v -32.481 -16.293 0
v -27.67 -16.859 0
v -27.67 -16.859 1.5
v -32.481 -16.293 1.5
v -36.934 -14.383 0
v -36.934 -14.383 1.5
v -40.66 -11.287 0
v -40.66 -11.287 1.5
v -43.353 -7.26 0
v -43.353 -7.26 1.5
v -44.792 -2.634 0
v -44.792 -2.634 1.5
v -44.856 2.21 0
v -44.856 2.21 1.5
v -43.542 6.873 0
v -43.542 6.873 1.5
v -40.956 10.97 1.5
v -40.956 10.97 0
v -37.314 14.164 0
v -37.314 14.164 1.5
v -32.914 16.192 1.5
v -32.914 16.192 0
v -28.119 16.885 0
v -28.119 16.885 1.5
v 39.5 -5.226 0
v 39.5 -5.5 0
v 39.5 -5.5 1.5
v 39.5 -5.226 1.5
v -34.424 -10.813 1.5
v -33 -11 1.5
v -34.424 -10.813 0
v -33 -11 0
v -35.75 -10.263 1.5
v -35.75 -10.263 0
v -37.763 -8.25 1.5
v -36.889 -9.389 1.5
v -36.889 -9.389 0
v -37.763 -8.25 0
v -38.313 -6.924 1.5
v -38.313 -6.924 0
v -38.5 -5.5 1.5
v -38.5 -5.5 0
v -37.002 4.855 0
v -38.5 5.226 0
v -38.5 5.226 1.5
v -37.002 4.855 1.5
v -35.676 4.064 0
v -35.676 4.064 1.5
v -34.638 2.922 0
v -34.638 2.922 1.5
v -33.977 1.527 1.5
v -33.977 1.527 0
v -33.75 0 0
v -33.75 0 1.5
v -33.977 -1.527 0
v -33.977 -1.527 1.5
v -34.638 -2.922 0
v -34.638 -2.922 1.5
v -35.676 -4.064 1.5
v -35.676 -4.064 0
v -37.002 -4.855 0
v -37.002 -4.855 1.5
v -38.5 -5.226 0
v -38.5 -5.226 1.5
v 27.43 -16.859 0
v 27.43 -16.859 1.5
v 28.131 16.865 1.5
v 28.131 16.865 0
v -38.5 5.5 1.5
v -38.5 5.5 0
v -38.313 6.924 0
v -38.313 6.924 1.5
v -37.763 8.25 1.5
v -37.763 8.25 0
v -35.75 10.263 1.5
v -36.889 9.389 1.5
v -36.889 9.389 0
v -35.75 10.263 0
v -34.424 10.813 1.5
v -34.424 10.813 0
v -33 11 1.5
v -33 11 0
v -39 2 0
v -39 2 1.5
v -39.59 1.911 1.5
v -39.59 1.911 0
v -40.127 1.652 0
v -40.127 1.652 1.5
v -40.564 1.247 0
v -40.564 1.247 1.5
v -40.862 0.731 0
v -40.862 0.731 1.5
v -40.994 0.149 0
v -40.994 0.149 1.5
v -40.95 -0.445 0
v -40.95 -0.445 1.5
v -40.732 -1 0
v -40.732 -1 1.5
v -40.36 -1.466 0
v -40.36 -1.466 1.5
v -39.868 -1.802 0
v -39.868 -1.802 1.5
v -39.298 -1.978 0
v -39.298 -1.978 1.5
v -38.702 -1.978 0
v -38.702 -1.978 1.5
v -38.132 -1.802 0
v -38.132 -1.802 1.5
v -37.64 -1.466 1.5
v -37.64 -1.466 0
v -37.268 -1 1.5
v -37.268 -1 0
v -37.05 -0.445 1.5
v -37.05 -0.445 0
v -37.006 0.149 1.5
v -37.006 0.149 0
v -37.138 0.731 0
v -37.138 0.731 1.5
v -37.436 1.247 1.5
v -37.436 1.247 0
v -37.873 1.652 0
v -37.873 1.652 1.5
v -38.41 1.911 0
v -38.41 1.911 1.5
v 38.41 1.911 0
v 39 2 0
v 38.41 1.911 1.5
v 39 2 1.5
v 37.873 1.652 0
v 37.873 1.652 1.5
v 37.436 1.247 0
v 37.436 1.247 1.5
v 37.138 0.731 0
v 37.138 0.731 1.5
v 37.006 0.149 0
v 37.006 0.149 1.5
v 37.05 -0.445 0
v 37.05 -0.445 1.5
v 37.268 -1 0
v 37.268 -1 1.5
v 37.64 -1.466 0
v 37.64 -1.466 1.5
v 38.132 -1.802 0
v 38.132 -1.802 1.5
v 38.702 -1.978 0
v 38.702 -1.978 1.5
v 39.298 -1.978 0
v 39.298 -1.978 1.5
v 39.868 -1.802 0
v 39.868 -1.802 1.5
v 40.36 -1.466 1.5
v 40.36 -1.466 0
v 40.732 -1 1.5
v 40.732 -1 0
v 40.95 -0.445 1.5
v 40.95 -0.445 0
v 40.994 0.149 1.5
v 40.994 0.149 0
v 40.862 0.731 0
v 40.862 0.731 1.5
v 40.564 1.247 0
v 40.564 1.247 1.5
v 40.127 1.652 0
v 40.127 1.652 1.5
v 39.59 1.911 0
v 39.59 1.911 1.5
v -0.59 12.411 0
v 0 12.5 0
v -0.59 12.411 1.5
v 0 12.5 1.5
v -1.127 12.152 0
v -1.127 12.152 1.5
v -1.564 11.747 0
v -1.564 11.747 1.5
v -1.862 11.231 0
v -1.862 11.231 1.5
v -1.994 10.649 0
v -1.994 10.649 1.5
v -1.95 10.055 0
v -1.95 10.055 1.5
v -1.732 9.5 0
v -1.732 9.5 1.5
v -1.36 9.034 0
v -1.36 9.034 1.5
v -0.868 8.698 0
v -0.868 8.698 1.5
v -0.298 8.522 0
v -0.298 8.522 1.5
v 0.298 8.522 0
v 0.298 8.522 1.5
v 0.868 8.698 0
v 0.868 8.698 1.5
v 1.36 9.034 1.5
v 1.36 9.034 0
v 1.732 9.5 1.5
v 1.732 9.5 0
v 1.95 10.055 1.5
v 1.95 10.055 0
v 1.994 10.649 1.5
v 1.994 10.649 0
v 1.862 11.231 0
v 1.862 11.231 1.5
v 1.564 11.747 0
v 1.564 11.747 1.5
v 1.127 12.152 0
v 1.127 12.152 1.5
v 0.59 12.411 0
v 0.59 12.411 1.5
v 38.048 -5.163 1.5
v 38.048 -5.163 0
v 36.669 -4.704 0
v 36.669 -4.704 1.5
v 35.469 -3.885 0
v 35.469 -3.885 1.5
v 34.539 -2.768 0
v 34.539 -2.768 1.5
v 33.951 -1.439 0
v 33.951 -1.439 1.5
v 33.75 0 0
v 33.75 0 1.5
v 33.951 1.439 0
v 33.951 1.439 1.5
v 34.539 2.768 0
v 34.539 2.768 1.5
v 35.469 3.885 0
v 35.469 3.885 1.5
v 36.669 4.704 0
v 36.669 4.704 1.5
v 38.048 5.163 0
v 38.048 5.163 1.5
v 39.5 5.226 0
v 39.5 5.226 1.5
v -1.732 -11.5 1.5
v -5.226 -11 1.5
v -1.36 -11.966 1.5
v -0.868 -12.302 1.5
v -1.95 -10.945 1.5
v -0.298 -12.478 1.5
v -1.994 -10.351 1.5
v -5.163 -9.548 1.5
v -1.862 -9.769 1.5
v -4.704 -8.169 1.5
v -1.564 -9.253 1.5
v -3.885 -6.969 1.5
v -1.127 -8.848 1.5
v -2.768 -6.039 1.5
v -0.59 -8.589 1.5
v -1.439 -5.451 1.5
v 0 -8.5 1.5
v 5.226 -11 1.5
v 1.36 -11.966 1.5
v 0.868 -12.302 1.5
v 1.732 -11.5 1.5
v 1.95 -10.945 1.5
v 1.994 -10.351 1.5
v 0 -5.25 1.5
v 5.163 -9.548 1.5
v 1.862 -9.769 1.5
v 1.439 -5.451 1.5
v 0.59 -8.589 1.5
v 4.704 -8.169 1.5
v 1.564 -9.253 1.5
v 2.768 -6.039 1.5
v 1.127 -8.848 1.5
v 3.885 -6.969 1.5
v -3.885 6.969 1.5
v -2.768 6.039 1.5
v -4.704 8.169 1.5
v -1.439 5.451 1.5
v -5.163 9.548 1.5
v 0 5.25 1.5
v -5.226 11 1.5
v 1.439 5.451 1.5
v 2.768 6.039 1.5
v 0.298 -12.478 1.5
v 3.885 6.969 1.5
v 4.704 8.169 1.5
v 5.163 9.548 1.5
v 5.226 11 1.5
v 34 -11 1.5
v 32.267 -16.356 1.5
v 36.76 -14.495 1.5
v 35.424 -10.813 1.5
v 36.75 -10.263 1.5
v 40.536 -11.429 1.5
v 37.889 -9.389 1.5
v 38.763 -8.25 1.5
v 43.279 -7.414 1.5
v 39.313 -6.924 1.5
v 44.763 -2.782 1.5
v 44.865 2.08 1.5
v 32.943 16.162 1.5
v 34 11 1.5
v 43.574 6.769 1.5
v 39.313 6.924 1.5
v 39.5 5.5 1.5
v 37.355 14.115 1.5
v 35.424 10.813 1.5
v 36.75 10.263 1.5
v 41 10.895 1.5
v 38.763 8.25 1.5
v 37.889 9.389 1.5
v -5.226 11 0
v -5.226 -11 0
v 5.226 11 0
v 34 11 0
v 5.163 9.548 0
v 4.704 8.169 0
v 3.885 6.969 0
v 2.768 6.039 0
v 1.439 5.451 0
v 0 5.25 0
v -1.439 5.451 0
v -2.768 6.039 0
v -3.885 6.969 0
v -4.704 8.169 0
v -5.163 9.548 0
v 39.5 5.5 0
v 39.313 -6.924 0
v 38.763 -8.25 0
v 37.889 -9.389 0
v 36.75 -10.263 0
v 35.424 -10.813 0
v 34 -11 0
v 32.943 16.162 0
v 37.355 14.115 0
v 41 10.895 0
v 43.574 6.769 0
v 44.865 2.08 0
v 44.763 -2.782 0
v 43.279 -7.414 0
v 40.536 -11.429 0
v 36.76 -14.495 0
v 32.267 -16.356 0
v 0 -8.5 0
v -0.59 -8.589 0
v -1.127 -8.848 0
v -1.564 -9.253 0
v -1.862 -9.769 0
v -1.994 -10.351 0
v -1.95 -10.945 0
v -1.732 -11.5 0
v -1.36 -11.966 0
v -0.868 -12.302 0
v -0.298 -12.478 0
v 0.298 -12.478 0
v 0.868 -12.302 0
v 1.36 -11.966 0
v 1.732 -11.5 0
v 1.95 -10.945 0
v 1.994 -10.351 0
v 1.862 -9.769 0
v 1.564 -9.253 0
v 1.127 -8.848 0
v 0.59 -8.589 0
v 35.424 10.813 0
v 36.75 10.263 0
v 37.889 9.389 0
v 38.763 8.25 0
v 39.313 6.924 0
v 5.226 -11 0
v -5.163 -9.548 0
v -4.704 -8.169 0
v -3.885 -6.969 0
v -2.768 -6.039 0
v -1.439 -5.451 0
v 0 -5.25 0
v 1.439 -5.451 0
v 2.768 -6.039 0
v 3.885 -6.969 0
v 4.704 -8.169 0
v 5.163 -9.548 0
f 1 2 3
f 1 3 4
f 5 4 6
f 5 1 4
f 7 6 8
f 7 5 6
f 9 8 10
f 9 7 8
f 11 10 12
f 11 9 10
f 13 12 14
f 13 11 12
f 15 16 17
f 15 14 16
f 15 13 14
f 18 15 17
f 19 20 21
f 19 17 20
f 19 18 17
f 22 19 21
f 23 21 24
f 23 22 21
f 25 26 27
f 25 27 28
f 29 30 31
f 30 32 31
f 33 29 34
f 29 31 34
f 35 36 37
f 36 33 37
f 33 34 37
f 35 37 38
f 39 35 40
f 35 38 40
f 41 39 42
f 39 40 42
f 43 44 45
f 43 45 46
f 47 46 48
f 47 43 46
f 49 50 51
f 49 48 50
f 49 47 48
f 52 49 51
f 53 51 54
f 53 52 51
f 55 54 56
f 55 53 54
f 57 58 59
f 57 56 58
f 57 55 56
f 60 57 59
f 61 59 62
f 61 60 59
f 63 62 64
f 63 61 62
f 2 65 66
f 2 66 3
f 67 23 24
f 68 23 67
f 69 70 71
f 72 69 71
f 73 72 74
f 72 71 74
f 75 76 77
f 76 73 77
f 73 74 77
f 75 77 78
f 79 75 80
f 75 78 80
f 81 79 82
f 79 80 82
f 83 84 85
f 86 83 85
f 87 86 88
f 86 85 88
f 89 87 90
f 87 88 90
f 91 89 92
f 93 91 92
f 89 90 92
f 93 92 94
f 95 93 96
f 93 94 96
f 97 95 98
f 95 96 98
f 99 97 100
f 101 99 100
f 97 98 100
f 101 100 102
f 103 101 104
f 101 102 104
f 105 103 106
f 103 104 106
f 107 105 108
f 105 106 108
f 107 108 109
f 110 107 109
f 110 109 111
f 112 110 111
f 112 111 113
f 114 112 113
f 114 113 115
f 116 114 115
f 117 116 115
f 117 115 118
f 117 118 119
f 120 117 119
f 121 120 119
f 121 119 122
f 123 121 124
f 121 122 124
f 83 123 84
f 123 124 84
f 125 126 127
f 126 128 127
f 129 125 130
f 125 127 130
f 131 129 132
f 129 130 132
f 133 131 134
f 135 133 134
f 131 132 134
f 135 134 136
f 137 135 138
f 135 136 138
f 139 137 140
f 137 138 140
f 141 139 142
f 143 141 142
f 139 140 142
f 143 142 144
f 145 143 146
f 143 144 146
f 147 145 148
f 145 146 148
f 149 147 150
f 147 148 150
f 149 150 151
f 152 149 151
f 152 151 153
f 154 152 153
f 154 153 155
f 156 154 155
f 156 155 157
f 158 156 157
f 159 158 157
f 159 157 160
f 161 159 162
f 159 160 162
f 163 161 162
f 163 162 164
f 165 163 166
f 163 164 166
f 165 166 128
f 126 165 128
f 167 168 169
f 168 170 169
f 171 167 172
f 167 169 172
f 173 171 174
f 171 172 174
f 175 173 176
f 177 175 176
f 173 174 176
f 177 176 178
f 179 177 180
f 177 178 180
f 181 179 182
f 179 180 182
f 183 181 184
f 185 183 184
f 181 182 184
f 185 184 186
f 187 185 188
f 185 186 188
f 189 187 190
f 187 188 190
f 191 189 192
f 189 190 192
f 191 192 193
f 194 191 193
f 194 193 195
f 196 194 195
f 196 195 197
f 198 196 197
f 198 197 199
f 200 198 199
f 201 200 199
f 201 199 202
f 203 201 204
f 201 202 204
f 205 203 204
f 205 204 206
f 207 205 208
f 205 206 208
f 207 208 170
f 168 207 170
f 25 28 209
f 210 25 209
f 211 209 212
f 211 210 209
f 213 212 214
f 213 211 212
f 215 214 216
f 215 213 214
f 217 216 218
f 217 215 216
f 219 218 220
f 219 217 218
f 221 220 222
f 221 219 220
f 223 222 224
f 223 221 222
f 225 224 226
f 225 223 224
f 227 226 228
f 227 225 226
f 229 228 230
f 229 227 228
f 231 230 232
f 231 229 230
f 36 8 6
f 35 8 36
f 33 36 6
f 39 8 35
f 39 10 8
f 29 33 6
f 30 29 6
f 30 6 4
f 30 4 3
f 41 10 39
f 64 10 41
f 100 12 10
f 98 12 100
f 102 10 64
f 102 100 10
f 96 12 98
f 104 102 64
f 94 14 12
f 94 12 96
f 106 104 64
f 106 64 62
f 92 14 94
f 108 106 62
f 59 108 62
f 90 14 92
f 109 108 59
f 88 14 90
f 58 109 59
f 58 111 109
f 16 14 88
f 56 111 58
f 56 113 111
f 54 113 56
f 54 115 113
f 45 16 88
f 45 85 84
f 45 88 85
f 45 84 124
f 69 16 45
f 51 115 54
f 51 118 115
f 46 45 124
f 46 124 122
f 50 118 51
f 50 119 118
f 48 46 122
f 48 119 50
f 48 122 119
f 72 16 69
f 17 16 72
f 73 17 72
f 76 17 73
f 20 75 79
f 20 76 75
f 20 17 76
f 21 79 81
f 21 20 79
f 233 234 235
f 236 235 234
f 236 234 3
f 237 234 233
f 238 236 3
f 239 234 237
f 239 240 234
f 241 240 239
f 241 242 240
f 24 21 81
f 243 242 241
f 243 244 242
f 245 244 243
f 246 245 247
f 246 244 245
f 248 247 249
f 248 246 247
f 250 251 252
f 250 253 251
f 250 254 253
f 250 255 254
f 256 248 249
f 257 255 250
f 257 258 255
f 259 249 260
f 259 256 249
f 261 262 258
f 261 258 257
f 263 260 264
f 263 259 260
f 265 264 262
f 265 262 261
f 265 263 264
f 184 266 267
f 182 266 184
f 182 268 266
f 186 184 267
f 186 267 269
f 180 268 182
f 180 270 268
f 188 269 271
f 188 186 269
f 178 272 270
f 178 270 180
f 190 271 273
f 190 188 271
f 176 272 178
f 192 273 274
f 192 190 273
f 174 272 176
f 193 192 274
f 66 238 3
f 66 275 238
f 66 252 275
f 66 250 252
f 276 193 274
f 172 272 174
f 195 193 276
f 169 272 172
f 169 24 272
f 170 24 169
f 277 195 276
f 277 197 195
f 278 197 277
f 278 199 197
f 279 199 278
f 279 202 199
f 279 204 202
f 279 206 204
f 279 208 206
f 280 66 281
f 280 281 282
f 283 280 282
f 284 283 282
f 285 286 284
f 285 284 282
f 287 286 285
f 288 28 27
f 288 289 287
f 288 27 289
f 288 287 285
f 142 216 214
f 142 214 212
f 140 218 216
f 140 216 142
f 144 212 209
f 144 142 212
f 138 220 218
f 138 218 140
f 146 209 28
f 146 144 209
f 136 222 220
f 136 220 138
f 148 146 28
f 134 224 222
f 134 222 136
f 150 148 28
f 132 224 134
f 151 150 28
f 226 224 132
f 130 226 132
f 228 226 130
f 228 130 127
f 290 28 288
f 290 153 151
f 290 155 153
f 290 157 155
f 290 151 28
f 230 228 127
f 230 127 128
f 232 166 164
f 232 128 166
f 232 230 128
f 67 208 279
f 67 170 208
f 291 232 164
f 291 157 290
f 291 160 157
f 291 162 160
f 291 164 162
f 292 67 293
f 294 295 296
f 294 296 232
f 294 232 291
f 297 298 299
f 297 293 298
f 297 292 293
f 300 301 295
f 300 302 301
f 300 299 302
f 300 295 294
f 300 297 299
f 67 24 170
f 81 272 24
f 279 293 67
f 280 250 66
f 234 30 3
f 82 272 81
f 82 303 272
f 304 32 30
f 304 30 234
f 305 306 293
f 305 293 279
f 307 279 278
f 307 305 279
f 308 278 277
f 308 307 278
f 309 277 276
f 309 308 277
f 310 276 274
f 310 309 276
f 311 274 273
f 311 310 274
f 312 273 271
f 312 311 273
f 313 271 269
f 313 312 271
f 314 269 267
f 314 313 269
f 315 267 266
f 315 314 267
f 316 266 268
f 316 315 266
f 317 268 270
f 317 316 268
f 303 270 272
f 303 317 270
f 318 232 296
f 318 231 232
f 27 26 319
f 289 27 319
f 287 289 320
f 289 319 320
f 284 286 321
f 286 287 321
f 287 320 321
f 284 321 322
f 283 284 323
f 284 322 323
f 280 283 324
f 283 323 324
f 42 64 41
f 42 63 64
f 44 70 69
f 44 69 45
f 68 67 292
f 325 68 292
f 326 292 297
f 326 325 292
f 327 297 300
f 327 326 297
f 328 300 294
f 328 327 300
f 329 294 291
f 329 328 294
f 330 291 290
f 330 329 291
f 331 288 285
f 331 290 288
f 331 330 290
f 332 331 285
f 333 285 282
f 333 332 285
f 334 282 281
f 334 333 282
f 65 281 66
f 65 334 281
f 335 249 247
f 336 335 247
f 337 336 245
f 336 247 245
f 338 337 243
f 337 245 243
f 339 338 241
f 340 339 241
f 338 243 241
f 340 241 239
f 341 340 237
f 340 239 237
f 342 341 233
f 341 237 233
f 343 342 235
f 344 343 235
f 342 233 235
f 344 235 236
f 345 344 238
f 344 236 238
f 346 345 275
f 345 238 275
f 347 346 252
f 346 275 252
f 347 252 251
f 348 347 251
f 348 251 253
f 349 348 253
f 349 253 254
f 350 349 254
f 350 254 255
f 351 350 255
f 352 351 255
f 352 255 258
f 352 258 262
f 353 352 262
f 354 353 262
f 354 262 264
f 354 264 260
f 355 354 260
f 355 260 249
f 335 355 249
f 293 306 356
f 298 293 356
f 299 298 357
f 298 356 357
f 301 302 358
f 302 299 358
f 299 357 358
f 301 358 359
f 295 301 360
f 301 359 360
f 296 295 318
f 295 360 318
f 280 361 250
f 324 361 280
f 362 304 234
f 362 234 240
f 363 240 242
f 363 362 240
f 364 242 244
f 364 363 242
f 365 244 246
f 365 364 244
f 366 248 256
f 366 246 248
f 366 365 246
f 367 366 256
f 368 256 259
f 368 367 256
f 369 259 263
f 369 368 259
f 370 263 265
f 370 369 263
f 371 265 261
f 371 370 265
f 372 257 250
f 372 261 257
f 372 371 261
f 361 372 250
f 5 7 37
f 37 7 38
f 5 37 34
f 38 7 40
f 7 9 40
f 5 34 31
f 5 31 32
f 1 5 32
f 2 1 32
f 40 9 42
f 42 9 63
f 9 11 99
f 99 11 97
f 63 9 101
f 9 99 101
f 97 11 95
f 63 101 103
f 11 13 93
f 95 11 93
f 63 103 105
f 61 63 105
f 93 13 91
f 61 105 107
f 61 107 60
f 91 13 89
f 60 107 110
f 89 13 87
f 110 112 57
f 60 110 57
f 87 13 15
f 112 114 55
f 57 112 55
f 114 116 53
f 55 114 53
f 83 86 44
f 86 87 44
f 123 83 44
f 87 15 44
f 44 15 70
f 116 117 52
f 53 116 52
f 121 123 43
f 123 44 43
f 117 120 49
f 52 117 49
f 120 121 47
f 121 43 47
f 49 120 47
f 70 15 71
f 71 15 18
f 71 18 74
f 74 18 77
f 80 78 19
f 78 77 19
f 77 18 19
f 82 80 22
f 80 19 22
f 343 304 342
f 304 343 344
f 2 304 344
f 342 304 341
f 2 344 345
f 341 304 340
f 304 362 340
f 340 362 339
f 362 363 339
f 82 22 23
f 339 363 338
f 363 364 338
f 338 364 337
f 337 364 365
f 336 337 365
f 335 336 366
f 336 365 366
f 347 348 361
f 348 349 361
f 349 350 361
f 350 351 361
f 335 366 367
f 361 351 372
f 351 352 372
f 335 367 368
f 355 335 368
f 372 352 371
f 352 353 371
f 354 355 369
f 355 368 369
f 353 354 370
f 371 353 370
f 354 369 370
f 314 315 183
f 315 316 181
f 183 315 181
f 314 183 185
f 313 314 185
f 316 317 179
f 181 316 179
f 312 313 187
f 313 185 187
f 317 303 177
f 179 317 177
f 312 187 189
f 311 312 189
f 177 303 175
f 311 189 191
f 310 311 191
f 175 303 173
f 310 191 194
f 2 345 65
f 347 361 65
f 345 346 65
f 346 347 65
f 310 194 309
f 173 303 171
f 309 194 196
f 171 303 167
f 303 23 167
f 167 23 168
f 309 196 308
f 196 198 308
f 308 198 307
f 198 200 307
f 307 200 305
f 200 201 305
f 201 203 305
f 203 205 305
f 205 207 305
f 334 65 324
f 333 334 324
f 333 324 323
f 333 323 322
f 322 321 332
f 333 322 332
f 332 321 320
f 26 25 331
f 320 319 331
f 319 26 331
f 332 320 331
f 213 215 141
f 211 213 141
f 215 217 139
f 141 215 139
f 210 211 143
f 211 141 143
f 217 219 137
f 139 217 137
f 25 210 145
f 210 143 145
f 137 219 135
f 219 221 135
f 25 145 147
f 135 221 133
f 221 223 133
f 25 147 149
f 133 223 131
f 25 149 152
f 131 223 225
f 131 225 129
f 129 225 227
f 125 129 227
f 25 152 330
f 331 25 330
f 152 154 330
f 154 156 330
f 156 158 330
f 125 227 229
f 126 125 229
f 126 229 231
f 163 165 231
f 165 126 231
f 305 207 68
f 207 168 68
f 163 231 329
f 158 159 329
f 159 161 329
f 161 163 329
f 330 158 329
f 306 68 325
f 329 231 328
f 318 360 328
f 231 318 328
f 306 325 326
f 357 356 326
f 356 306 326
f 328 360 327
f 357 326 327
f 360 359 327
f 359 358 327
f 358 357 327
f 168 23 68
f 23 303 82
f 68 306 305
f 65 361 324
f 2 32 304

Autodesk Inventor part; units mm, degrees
ref_plane "YZ Plane" through (0, 0, 0) normal (1, 0, 0) x (0, 1, 0)
ref_plane "XZ Plane" through (0, 0, 0) normal (0, 1, 0) x (-1, 0, 0)
ref_plane "XY Plane" through (0, 0, 0) normal (0, 0, 1) x (1, 0, 0)
sketch "Sketch1" plane through (0, 0, 0) normal (0, 0, 1) x (1, 0, 0)
  line L0 (-28.1189, 16.8852) -> (28.1311, 16.8648)
  line L1 (44.9939, -0.0102) -> (44.9939, -0.0102)
  line L2 (27.4299, -16.8586) -> (-27.6697, -16.8586)
  line L3 (-45, 0.0102) -> (-45, 0.0102)
  arc A0 (-28.1189, 16.8852) -> (-27.6697, -16.8586) centre (-28.125, 0.0102) ccw
  arc A1 (27.4299, -16.8586) -> (28.1311, 16.8648) centre (28.125, -0.0041) ccw
  point P0 (0, 0)
  point P1 (-45, 16.8914)
  point P2 (45, 16.8586)
  point P3 (-45, -16.8586)
  dimension "d7" = 4
  dimension "d8" = 4
  dimension "d9" = 4
  dimension "d10" = 4
  dimension "d11" = 78
  dimension "d12" = 21
  dimension "d13" = 39
  dimension "d0" = 90
  dimension "d1" = 33.75
  dimension "d2" = 16.875
  dimension "d3" = 16.875
  dimension "d4" = 90
  dimension "d5" = 56.25
  dimension "d6" = 28.125
sketch "Sketch2" plane through (0, 0, 0) normal (0, 0, 1) x (1, 0, 0)
  circle A0 centre (-39, 0) radius 2
  circle A1 centre (39, 0) radius 2
  circle A2 centre (0, -10.5) radius 2
  circle A3 centre (0, 10.5) radius 2
  point P0 (0, 0)
  point P1 (0, 0)
  point P2 (-3.3578, 23.5)
  dimension "d7" = 4
  dimension "d8" = 4
  dimension "d9" = 4
  dimension "d10" = 4
  dimension "d11" = 78
  dimension "d12" = 21
  dimension "d13" = 39
sketch "Sketch3" plane through (0, 0, 0) normal (0, 0, 1) x (1, 0, 0)
  arc A0 (-5.2261, 11) -> (5.2261, 11) centre (0, 10.5) ccw
  arc A1 (-38.5, -5.2262) -> (-38.5, 5.2261) centre (-39, 0) ccw
  arc A2 (5.2261, -11) -> (-5.2261, -11) centre (0, -10.5) ccw
  arc A3 (39.5, 5.2261) -> (39.5, -5.2262) centre (39, 0) ccw
  line L0 (-38.5, -5.2262) -> (-38.5, -5.5)
  line L1 (-33, -11) -> (-5.2261, -11)
  line L2 (39.5, 5.2261) -> (39.5, 5.5)
  line L3 (34, 11) -> (5.2261, 11)
  line L4 (-5.2261, 11) -> (-33, 11)
  line L5 (-38.5, 5.5) -> (-38.5, 5.2261)
  line L6 (5.2261, -11) -> (34, -11)
  line L7 (39.5, -5.5) -> (39.5, -5.2262)
  arc A4 (-33, 11) -> (-38.5, 5.5) centre (-33, 5.5) ccw
  arc A5 (-38.5, -5.5) -> (-33, -11) centre (-33, -5.5) ccw
  arc A6 (39.5, 5.5) -> (34, 11) centre (34, 5.5) ccw
  arc A7 (34, -11) -> (39.5, -5.5) centre (34, -5.5) ccw
  point P0 (43.6422, -42)
  dimension "d14" = 5.5
  dimension "d15" = 5.25
  dimension "d16" = 5.25
  dimension "d17" = 5.25
  dimension "d18" = 5.25
  dimension "d19" = 22
  dimension "d20" = 78
  dimension "d23" = 5.5
  dimension "d24" = 5.5
  dimension "d25" = 5.5
  dimension "d26" = 78
extrude "Extrusion1" add sketch "Sketch1" along normal blind 1.5
extrude "Extrusion2" cut sketch "Sketch3" along normal blind 1.5
hole "Hole1" at (-39, 0, 0) at (0, 10.5, 0) at (0, -10.5, 0) at (39, 0, 0) direction (0, 0, 1) diameter 4 end through all
equation "\"d8\" = d7"
equation "\"d9\" = d7"
equation "\"d10\" = d7"
equation "\"d2\" = 0.5 * d1"
equation "\"d3\" = 0.5 * d1"
equation "\"d4\" = d0"
equation "\"d5\" = d0 - 2 * d3"
equation "\"d6\" = 0.5 * d5"
equation "\"d14\" = 0.5 * d21"
equation "\"d15\" = d16"
equation "\"d17\" = d16"
equation "\"d18\" = d16"
equation "\"d19\" = 2 * d21"
equation "\"d26\" = d20"
equation "\"d21\" = 11"
properties part number "ConnectorSeal" material "Rubber, Silicone"
